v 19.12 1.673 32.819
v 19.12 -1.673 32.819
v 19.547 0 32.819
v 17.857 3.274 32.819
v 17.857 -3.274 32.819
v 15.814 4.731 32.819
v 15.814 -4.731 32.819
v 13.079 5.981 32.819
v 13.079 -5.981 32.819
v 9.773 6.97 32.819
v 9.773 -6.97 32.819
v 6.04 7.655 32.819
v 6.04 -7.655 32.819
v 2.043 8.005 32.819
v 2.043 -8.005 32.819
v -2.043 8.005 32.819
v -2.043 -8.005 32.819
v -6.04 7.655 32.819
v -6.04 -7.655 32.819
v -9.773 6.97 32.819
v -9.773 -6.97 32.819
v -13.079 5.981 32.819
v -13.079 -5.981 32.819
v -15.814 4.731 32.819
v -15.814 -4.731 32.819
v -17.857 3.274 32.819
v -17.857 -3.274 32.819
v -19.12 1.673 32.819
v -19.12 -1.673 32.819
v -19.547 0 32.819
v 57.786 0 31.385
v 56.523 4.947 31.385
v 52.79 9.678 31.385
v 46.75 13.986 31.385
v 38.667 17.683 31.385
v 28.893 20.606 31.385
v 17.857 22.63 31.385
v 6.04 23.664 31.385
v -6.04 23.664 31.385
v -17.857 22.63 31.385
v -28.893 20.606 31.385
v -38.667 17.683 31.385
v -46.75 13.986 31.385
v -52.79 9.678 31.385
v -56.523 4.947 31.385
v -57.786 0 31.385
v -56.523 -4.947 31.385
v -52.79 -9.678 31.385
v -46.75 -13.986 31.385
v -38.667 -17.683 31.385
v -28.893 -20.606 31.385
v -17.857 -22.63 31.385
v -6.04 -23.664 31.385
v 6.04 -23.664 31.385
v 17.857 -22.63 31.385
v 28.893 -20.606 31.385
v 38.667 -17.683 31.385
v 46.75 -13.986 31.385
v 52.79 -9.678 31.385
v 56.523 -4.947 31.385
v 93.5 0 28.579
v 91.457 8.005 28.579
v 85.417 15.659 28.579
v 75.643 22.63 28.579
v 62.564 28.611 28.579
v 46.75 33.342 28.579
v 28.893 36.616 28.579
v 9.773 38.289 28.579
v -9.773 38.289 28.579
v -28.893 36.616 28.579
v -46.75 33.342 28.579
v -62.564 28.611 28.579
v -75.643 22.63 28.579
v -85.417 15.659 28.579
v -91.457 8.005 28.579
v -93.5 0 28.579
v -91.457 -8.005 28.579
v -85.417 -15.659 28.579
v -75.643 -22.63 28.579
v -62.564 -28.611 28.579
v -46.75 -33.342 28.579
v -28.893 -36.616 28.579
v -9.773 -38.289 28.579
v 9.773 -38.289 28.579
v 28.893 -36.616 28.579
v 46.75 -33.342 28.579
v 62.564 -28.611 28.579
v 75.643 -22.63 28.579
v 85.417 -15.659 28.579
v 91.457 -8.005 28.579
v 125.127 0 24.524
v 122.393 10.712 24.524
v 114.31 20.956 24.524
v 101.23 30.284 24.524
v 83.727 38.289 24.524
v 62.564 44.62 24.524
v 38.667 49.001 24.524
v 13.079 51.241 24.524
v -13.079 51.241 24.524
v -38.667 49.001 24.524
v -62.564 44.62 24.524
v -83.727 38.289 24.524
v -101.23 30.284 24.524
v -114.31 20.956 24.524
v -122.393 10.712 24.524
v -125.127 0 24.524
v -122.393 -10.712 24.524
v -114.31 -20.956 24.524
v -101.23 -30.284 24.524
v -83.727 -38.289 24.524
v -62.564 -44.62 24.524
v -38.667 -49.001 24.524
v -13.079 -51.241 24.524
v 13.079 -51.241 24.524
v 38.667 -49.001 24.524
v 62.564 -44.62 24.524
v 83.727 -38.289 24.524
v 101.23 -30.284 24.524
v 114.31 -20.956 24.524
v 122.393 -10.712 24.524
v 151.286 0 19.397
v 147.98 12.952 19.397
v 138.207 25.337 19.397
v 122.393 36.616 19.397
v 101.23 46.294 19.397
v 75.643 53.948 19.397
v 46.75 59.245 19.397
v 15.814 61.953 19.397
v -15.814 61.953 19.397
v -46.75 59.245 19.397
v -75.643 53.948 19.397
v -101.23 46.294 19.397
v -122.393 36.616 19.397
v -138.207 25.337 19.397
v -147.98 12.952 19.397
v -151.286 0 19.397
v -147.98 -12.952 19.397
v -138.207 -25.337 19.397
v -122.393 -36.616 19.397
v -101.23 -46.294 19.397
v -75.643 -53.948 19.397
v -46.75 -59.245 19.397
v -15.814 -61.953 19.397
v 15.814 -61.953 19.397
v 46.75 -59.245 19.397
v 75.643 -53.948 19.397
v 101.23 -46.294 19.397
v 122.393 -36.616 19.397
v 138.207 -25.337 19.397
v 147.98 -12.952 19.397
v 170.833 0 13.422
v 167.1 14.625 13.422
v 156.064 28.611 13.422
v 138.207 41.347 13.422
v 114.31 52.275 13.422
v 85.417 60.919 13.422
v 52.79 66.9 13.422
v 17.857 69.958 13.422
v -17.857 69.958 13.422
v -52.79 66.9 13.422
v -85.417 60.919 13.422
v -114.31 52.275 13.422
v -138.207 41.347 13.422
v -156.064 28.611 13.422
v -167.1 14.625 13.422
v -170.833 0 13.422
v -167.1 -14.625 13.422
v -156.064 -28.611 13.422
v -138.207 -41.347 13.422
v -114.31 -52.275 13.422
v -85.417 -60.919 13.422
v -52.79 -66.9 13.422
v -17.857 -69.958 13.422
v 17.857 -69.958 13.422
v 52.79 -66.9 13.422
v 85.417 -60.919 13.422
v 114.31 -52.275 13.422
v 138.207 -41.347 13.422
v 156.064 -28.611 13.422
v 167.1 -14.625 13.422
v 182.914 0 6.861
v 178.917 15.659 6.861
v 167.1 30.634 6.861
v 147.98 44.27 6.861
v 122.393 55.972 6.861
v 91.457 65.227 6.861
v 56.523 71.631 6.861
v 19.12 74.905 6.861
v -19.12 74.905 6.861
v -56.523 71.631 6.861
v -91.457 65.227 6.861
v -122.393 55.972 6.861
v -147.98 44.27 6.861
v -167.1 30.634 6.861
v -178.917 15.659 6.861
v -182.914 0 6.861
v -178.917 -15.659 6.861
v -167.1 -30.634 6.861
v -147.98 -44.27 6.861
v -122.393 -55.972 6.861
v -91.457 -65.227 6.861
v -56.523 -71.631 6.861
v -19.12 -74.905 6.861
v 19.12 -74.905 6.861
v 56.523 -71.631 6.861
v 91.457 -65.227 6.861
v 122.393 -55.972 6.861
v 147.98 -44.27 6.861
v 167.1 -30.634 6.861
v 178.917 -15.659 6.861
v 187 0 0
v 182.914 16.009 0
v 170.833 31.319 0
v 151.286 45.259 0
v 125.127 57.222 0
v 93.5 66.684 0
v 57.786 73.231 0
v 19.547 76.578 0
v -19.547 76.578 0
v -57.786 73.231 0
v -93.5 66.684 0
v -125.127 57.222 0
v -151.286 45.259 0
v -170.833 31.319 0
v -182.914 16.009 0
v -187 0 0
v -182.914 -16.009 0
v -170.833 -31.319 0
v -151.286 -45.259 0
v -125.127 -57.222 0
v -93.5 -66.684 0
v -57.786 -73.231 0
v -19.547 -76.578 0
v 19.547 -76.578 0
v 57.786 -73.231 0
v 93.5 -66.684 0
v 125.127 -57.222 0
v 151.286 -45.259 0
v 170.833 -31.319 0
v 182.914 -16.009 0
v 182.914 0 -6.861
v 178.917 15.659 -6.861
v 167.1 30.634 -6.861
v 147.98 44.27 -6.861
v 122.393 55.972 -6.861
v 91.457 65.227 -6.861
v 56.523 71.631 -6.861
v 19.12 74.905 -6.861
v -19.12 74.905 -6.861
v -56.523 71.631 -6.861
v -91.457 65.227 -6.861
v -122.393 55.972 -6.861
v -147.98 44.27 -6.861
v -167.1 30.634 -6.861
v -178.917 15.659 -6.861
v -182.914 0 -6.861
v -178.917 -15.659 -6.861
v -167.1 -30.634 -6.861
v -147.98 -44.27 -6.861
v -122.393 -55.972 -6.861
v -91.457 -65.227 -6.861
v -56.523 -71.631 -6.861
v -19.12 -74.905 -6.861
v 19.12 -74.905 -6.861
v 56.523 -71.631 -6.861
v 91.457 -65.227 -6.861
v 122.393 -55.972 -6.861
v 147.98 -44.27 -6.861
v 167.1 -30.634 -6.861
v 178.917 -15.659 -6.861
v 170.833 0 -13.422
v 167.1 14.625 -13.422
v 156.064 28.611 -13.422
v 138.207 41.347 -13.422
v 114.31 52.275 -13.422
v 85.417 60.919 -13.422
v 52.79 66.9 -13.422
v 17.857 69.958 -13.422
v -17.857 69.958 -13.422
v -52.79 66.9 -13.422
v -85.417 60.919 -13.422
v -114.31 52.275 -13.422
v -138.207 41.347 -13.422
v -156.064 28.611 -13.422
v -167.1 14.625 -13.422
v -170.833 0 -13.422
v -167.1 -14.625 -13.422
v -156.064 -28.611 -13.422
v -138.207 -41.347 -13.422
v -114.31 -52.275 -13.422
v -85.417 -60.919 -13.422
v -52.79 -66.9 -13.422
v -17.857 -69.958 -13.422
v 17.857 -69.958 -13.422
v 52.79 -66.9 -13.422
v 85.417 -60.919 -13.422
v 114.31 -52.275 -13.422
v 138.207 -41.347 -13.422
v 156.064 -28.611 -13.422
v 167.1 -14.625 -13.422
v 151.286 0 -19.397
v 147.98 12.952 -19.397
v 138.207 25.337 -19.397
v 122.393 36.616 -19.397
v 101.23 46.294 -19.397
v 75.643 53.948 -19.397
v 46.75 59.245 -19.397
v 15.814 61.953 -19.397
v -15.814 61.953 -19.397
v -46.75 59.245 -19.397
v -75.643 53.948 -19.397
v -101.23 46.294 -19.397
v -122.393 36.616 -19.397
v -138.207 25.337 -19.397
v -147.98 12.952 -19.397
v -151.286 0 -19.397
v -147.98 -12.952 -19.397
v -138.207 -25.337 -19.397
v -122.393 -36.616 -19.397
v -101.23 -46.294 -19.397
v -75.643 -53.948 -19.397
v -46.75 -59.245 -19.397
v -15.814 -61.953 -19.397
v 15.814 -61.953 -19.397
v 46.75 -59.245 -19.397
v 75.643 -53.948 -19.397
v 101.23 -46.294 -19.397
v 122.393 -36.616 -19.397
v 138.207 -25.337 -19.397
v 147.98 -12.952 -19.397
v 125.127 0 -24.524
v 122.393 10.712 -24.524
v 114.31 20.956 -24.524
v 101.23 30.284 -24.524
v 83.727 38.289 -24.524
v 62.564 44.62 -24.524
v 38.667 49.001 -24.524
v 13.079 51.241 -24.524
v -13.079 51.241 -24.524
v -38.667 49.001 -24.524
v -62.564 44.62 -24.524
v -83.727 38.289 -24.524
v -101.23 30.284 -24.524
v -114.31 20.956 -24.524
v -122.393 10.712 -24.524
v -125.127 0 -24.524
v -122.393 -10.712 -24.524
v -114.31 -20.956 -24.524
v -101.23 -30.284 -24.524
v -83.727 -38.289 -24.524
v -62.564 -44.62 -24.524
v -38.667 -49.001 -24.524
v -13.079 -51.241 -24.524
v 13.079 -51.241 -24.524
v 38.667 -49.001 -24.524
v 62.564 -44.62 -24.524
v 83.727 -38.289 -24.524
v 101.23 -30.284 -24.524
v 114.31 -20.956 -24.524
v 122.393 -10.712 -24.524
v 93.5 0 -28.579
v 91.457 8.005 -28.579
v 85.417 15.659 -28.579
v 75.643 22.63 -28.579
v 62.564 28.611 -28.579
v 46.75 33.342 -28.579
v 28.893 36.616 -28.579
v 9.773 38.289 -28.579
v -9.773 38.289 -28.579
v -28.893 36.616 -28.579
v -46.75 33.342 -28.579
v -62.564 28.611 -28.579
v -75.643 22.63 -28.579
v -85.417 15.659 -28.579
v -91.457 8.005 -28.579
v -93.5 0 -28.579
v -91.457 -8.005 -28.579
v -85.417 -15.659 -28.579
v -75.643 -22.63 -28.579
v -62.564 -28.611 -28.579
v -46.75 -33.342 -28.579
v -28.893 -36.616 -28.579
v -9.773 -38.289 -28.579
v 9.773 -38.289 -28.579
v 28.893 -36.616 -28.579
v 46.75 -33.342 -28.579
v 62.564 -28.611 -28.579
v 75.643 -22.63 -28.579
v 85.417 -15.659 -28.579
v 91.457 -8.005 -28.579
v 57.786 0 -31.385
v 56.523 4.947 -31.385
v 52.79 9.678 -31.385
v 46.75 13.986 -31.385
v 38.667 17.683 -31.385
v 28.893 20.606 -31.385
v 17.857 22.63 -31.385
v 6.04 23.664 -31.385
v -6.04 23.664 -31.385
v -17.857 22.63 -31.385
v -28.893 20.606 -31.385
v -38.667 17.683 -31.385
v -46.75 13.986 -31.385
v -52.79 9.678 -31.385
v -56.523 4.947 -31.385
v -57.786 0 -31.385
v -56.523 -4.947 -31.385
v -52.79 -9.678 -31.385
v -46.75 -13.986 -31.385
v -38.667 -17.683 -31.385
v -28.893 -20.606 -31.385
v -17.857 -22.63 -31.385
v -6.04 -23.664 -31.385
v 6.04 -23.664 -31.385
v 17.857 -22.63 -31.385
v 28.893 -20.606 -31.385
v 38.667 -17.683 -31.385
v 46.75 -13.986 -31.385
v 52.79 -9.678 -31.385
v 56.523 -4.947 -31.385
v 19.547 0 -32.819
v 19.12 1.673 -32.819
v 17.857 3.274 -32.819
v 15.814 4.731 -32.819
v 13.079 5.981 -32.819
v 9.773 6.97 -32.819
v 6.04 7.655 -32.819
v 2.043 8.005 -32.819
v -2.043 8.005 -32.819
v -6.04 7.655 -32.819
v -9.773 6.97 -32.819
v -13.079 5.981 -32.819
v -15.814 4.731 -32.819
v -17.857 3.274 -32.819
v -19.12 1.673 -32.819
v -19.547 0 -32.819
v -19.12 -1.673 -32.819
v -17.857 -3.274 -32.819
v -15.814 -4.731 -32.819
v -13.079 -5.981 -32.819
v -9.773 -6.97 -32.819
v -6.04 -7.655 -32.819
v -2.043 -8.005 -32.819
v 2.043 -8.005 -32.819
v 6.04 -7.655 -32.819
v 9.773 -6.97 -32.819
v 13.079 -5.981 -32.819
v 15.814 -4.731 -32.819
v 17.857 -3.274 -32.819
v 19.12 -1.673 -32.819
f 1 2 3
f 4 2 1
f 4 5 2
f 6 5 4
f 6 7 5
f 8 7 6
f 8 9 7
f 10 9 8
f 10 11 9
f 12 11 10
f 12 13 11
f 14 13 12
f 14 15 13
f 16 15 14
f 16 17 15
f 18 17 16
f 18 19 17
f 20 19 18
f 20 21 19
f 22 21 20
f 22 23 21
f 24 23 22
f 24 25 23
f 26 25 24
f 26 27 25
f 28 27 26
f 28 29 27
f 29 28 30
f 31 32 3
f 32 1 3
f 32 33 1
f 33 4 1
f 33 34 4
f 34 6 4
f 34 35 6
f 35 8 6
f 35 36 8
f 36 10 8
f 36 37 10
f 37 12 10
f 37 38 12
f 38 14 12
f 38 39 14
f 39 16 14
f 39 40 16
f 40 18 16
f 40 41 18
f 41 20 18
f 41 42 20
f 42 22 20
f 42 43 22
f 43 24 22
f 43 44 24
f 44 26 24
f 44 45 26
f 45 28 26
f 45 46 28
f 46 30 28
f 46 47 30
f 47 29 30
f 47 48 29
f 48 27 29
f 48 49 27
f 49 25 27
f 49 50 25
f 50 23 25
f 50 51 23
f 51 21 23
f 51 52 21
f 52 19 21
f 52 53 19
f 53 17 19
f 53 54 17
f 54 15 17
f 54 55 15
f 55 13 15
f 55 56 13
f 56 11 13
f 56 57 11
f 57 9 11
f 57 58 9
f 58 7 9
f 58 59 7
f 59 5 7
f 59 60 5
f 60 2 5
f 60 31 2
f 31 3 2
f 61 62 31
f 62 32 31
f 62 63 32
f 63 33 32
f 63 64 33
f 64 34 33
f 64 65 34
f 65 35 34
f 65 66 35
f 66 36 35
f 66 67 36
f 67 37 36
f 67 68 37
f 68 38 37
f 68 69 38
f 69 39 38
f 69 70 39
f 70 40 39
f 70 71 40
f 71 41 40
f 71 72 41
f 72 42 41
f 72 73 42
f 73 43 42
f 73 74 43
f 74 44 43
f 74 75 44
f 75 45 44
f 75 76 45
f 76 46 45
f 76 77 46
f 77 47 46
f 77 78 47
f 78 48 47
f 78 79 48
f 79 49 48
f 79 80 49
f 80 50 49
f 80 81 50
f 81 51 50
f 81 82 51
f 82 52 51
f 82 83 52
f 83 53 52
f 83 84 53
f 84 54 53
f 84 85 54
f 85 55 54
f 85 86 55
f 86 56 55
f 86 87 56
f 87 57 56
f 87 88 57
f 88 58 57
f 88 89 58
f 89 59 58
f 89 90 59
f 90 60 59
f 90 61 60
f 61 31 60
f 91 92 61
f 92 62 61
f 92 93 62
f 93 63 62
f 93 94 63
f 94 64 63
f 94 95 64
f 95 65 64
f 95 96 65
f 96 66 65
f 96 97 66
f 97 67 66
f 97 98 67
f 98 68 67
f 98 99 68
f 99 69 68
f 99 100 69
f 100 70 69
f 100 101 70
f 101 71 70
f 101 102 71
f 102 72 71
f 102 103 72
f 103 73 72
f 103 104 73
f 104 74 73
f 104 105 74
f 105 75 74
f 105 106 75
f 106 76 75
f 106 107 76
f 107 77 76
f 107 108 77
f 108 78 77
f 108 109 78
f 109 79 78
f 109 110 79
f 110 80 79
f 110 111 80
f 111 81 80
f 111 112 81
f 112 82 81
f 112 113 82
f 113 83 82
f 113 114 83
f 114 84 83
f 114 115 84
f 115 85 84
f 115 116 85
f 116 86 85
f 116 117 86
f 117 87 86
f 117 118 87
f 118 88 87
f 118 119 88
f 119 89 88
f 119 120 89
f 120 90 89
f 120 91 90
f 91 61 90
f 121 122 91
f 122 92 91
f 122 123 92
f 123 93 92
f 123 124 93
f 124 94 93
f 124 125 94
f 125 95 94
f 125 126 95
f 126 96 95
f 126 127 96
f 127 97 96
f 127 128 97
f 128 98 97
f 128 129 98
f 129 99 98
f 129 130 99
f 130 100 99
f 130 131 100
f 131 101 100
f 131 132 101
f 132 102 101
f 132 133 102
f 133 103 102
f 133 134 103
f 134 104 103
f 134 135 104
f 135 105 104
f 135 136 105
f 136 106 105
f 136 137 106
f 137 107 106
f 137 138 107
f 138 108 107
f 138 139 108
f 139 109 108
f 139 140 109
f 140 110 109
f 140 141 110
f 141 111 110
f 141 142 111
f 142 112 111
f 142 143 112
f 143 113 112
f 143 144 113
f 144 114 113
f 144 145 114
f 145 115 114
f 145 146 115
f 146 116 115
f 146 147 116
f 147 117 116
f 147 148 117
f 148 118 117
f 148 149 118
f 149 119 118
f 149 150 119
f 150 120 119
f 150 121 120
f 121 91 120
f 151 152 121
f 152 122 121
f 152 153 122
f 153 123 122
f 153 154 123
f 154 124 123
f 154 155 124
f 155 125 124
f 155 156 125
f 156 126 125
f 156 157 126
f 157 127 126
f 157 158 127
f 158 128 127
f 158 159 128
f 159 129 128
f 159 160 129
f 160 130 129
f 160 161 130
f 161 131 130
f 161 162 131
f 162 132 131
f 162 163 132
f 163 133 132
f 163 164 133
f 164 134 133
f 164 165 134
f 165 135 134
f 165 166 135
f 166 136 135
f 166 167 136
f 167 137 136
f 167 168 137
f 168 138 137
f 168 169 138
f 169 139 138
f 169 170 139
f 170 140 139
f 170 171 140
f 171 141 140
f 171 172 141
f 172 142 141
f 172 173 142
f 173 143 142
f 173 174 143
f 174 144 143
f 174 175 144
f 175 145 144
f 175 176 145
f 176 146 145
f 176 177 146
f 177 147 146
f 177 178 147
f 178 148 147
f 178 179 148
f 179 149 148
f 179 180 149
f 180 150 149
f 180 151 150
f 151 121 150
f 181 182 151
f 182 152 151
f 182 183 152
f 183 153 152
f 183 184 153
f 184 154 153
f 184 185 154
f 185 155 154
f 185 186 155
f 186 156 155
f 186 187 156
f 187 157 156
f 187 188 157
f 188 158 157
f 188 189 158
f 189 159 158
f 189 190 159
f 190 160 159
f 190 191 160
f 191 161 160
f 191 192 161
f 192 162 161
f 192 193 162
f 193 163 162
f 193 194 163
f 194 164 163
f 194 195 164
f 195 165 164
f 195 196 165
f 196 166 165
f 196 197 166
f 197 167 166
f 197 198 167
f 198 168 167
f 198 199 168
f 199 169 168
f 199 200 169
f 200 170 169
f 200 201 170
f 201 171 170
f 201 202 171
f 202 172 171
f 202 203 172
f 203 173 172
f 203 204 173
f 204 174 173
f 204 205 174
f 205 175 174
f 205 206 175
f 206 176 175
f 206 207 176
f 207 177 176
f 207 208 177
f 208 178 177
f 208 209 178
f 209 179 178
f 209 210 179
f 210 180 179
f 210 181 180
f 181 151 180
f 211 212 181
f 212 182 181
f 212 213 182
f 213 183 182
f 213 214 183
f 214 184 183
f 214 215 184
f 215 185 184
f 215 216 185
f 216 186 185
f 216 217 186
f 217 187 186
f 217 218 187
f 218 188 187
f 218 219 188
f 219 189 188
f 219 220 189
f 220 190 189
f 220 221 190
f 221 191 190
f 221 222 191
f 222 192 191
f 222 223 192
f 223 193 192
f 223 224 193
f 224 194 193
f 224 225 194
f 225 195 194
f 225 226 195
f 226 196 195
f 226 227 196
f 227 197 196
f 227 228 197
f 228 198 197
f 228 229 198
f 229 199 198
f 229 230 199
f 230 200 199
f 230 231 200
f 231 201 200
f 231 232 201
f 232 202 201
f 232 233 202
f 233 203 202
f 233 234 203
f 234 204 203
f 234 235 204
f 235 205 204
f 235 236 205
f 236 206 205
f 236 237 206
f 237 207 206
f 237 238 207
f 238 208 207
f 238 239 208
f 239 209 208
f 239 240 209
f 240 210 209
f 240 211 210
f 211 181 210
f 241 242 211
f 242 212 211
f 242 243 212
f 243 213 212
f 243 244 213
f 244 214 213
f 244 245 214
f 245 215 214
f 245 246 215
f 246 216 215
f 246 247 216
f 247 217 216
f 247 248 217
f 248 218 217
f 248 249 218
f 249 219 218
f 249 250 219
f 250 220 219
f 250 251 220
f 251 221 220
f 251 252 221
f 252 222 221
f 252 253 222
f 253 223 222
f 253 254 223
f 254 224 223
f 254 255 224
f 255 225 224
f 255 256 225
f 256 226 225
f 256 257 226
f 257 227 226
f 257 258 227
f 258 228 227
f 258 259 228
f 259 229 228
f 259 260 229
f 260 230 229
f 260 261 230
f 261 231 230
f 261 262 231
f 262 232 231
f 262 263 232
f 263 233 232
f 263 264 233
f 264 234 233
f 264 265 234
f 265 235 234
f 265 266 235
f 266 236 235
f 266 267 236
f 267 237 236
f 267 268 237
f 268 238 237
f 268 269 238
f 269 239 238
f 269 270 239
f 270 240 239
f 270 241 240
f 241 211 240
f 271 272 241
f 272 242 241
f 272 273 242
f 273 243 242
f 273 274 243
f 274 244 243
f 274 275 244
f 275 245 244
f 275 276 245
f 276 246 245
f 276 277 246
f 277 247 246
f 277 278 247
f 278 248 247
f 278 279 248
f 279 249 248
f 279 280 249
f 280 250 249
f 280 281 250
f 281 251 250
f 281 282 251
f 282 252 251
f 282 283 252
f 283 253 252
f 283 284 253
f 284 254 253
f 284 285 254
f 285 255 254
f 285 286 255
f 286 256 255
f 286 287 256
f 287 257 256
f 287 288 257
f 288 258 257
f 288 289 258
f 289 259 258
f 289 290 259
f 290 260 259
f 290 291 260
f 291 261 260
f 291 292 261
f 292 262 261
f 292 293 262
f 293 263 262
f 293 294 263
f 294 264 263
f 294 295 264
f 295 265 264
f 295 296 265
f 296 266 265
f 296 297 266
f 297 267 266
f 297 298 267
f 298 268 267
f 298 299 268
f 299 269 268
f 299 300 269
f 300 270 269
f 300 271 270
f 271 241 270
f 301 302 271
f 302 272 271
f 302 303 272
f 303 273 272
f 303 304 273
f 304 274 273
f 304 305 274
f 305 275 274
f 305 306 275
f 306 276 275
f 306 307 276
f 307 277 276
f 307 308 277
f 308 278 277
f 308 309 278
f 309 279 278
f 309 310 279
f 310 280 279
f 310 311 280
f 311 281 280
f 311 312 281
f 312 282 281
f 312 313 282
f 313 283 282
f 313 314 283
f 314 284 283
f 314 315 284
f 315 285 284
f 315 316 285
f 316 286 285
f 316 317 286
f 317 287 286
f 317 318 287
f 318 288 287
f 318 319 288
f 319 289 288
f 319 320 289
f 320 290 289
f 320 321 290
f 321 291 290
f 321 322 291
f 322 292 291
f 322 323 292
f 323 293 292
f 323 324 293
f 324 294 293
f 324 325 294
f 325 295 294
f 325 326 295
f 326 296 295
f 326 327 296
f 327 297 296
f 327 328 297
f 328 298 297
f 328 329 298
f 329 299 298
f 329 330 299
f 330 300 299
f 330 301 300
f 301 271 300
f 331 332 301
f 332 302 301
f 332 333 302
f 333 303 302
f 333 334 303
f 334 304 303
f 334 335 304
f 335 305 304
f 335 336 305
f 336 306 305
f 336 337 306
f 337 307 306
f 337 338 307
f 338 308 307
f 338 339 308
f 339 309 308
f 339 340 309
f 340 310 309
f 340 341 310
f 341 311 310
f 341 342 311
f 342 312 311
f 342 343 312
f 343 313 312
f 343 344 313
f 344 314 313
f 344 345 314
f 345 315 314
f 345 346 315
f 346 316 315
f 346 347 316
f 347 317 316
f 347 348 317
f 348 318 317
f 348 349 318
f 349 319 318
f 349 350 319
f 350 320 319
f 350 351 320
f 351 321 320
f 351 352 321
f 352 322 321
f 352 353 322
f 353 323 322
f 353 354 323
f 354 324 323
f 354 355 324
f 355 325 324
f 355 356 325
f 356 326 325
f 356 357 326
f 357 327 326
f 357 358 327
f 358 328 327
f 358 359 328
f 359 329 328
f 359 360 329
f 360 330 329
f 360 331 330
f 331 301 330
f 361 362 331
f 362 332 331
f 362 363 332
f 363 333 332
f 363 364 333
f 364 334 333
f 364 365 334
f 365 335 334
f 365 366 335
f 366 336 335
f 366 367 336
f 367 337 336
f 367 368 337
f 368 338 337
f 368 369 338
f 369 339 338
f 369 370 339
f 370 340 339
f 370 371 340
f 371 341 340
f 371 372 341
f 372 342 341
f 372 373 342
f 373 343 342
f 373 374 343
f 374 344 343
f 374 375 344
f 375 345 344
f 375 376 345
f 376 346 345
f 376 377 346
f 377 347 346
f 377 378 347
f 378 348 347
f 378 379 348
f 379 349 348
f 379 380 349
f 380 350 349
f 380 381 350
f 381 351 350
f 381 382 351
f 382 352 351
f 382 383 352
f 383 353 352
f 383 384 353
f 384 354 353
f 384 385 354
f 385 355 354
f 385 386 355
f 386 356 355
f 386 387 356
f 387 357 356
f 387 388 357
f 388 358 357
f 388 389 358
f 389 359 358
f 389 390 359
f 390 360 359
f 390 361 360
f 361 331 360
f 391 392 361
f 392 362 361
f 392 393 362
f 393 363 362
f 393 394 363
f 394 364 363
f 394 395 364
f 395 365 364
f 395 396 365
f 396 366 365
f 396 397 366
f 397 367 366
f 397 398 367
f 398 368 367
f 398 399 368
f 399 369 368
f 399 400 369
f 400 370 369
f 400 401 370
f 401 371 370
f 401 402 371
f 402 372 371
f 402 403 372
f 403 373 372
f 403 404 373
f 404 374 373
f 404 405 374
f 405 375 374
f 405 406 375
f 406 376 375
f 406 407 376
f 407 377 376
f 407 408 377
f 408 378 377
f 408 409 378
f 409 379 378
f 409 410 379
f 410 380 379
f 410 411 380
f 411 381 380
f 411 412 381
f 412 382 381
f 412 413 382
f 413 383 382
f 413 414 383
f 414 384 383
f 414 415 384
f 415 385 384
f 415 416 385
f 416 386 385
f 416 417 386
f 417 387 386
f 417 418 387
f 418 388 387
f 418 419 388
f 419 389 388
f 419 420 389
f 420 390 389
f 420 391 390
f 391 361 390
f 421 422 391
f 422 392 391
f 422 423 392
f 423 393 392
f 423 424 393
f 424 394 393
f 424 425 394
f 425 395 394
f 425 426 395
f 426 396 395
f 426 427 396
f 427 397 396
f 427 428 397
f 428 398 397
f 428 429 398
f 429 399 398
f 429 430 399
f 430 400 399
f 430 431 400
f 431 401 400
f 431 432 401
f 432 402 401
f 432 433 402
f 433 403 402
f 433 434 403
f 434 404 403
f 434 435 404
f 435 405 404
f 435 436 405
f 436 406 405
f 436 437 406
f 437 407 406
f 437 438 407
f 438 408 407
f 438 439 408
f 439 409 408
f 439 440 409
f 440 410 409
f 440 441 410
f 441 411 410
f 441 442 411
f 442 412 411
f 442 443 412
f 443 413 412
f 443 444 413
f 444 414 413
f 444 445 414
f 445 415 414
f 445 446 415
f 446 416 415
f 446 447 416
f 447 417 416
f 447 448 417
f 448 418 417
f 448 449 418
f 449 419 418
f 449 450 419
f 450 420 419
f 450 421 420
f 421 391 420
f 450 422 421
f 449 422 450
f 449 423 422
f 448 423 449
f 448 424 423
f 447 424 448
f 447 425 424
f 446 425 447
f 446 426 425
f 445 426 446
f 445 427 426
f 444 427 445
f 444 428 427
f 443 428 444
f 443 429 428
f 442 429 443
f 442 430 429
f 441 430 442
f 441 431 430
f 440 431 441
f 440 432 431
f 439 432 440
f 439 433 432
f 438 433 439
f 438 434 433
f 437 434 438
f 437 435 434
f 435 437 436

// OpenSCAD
// Generated by SolidPython 1.0.1 on 2020-07-29 00:46:52


scale(v = [17, 7, 3]) {
	sphere(r = 11);
}
/***********************************************
*********      SolidPython code:      **********
************************************************
 
# import packages: SolidPython
from solid import *
from solid.utils import *
from itertools import chain, combinations, permutations


class Resize:

    def __init__(self, scad_file):
        self.scad_file = scad_file
        #self.scad_file = import_scad(scad_file)
        # cone/cylinder param:
        self.r1 = 0
        self.r2 = 0
        self.h = 0
        # rectangular prism param:
        self.w = 0
        self.l = 0
        # ellipse param:
        self.r = 0

    # import OpenScad code (file name corresponds to shape)


    # classify shape + parameters
    def assign(self, param1, param2, param3):
        if self.scad_file == 'cone.scad':
            self.r1 = param1
            self.r2 = param2
            self.h = param3
        elif self.scad_file == 'cylinder.scad':
            self.r1 = param1
            self.r2 = param2
            self.h = param3
        elif self.scad_file == 'rectangularPrism.scad':
            self.h = param1
            self.l = param2
            self.w = param3
        else:
            self.r = param1
            self.h = param2

    # resize parameters
    def iterate(self):
        x = range(3, 20, 2)
        i = 1
        if self.scad_file == 'cone.scad':
            tempList = list(permutations(x, 2))
            for temp in tempList:
                param1 = temp[0]
                param2 = temp[1]
                filepath = 'produced_scad_files/' + 'cone' + str(param1) + '_' + str(param2) + '_' + '.scad'
                scad_render_to_file(cylinder(h=param1, r1=param2, r2=0), filepath)

        elif self.scad_file == 'cylinder.scad':
            tempList = list(permutations(x, 3))
            for temp in tempList:
                param1 = temp[0]
                param2 = temp[1]
                filepath = 'produced_scad_files/' + 'cylinder' + str(param1) + '_' + str(param2) + '_' + '.scad'
                scad_render_to_file(cylinder(h=param1, r1=param2, r2=param2), filepath)

        elif self.scad_file == 'rectangularPrism.scad':
            tempList = list(permutations(x, 3))
            for temp in tempList:
                param1 = temp[0]
                param2 = temp[1]
                param3 = temp[2]
                filepath = 'produced_scad_files/' + 'rectangularPrism' + str(param1) + '_' + str(param2) + '_' + str(
                    param3) + '.scad'
                scad_render_to_file(cube(size=(param1, param2, param3)), filepath)

        elif self.scad_file == 'ellipse.scad':
            tempList = list(permutations(x, 4))
            for temp in tempList:
                param1 = temp[0]
                param2 = temp[1]
                param3 = temp[2]
                param4 = temp[3]
                filepath = 'produced_scad_files/' + 'ellipse' + str(param1) + '_' + str(param2) + '_' + str(param3) + '_' + str(param4) + '.scad'
                scad_render_to_file(scale([param1, param2, param3])(sphere(r=param4)), filepath)

    def render_to_scadfile(self):
        scad_render_to_file(scad, 'example.scad') 
 
************************************************/
